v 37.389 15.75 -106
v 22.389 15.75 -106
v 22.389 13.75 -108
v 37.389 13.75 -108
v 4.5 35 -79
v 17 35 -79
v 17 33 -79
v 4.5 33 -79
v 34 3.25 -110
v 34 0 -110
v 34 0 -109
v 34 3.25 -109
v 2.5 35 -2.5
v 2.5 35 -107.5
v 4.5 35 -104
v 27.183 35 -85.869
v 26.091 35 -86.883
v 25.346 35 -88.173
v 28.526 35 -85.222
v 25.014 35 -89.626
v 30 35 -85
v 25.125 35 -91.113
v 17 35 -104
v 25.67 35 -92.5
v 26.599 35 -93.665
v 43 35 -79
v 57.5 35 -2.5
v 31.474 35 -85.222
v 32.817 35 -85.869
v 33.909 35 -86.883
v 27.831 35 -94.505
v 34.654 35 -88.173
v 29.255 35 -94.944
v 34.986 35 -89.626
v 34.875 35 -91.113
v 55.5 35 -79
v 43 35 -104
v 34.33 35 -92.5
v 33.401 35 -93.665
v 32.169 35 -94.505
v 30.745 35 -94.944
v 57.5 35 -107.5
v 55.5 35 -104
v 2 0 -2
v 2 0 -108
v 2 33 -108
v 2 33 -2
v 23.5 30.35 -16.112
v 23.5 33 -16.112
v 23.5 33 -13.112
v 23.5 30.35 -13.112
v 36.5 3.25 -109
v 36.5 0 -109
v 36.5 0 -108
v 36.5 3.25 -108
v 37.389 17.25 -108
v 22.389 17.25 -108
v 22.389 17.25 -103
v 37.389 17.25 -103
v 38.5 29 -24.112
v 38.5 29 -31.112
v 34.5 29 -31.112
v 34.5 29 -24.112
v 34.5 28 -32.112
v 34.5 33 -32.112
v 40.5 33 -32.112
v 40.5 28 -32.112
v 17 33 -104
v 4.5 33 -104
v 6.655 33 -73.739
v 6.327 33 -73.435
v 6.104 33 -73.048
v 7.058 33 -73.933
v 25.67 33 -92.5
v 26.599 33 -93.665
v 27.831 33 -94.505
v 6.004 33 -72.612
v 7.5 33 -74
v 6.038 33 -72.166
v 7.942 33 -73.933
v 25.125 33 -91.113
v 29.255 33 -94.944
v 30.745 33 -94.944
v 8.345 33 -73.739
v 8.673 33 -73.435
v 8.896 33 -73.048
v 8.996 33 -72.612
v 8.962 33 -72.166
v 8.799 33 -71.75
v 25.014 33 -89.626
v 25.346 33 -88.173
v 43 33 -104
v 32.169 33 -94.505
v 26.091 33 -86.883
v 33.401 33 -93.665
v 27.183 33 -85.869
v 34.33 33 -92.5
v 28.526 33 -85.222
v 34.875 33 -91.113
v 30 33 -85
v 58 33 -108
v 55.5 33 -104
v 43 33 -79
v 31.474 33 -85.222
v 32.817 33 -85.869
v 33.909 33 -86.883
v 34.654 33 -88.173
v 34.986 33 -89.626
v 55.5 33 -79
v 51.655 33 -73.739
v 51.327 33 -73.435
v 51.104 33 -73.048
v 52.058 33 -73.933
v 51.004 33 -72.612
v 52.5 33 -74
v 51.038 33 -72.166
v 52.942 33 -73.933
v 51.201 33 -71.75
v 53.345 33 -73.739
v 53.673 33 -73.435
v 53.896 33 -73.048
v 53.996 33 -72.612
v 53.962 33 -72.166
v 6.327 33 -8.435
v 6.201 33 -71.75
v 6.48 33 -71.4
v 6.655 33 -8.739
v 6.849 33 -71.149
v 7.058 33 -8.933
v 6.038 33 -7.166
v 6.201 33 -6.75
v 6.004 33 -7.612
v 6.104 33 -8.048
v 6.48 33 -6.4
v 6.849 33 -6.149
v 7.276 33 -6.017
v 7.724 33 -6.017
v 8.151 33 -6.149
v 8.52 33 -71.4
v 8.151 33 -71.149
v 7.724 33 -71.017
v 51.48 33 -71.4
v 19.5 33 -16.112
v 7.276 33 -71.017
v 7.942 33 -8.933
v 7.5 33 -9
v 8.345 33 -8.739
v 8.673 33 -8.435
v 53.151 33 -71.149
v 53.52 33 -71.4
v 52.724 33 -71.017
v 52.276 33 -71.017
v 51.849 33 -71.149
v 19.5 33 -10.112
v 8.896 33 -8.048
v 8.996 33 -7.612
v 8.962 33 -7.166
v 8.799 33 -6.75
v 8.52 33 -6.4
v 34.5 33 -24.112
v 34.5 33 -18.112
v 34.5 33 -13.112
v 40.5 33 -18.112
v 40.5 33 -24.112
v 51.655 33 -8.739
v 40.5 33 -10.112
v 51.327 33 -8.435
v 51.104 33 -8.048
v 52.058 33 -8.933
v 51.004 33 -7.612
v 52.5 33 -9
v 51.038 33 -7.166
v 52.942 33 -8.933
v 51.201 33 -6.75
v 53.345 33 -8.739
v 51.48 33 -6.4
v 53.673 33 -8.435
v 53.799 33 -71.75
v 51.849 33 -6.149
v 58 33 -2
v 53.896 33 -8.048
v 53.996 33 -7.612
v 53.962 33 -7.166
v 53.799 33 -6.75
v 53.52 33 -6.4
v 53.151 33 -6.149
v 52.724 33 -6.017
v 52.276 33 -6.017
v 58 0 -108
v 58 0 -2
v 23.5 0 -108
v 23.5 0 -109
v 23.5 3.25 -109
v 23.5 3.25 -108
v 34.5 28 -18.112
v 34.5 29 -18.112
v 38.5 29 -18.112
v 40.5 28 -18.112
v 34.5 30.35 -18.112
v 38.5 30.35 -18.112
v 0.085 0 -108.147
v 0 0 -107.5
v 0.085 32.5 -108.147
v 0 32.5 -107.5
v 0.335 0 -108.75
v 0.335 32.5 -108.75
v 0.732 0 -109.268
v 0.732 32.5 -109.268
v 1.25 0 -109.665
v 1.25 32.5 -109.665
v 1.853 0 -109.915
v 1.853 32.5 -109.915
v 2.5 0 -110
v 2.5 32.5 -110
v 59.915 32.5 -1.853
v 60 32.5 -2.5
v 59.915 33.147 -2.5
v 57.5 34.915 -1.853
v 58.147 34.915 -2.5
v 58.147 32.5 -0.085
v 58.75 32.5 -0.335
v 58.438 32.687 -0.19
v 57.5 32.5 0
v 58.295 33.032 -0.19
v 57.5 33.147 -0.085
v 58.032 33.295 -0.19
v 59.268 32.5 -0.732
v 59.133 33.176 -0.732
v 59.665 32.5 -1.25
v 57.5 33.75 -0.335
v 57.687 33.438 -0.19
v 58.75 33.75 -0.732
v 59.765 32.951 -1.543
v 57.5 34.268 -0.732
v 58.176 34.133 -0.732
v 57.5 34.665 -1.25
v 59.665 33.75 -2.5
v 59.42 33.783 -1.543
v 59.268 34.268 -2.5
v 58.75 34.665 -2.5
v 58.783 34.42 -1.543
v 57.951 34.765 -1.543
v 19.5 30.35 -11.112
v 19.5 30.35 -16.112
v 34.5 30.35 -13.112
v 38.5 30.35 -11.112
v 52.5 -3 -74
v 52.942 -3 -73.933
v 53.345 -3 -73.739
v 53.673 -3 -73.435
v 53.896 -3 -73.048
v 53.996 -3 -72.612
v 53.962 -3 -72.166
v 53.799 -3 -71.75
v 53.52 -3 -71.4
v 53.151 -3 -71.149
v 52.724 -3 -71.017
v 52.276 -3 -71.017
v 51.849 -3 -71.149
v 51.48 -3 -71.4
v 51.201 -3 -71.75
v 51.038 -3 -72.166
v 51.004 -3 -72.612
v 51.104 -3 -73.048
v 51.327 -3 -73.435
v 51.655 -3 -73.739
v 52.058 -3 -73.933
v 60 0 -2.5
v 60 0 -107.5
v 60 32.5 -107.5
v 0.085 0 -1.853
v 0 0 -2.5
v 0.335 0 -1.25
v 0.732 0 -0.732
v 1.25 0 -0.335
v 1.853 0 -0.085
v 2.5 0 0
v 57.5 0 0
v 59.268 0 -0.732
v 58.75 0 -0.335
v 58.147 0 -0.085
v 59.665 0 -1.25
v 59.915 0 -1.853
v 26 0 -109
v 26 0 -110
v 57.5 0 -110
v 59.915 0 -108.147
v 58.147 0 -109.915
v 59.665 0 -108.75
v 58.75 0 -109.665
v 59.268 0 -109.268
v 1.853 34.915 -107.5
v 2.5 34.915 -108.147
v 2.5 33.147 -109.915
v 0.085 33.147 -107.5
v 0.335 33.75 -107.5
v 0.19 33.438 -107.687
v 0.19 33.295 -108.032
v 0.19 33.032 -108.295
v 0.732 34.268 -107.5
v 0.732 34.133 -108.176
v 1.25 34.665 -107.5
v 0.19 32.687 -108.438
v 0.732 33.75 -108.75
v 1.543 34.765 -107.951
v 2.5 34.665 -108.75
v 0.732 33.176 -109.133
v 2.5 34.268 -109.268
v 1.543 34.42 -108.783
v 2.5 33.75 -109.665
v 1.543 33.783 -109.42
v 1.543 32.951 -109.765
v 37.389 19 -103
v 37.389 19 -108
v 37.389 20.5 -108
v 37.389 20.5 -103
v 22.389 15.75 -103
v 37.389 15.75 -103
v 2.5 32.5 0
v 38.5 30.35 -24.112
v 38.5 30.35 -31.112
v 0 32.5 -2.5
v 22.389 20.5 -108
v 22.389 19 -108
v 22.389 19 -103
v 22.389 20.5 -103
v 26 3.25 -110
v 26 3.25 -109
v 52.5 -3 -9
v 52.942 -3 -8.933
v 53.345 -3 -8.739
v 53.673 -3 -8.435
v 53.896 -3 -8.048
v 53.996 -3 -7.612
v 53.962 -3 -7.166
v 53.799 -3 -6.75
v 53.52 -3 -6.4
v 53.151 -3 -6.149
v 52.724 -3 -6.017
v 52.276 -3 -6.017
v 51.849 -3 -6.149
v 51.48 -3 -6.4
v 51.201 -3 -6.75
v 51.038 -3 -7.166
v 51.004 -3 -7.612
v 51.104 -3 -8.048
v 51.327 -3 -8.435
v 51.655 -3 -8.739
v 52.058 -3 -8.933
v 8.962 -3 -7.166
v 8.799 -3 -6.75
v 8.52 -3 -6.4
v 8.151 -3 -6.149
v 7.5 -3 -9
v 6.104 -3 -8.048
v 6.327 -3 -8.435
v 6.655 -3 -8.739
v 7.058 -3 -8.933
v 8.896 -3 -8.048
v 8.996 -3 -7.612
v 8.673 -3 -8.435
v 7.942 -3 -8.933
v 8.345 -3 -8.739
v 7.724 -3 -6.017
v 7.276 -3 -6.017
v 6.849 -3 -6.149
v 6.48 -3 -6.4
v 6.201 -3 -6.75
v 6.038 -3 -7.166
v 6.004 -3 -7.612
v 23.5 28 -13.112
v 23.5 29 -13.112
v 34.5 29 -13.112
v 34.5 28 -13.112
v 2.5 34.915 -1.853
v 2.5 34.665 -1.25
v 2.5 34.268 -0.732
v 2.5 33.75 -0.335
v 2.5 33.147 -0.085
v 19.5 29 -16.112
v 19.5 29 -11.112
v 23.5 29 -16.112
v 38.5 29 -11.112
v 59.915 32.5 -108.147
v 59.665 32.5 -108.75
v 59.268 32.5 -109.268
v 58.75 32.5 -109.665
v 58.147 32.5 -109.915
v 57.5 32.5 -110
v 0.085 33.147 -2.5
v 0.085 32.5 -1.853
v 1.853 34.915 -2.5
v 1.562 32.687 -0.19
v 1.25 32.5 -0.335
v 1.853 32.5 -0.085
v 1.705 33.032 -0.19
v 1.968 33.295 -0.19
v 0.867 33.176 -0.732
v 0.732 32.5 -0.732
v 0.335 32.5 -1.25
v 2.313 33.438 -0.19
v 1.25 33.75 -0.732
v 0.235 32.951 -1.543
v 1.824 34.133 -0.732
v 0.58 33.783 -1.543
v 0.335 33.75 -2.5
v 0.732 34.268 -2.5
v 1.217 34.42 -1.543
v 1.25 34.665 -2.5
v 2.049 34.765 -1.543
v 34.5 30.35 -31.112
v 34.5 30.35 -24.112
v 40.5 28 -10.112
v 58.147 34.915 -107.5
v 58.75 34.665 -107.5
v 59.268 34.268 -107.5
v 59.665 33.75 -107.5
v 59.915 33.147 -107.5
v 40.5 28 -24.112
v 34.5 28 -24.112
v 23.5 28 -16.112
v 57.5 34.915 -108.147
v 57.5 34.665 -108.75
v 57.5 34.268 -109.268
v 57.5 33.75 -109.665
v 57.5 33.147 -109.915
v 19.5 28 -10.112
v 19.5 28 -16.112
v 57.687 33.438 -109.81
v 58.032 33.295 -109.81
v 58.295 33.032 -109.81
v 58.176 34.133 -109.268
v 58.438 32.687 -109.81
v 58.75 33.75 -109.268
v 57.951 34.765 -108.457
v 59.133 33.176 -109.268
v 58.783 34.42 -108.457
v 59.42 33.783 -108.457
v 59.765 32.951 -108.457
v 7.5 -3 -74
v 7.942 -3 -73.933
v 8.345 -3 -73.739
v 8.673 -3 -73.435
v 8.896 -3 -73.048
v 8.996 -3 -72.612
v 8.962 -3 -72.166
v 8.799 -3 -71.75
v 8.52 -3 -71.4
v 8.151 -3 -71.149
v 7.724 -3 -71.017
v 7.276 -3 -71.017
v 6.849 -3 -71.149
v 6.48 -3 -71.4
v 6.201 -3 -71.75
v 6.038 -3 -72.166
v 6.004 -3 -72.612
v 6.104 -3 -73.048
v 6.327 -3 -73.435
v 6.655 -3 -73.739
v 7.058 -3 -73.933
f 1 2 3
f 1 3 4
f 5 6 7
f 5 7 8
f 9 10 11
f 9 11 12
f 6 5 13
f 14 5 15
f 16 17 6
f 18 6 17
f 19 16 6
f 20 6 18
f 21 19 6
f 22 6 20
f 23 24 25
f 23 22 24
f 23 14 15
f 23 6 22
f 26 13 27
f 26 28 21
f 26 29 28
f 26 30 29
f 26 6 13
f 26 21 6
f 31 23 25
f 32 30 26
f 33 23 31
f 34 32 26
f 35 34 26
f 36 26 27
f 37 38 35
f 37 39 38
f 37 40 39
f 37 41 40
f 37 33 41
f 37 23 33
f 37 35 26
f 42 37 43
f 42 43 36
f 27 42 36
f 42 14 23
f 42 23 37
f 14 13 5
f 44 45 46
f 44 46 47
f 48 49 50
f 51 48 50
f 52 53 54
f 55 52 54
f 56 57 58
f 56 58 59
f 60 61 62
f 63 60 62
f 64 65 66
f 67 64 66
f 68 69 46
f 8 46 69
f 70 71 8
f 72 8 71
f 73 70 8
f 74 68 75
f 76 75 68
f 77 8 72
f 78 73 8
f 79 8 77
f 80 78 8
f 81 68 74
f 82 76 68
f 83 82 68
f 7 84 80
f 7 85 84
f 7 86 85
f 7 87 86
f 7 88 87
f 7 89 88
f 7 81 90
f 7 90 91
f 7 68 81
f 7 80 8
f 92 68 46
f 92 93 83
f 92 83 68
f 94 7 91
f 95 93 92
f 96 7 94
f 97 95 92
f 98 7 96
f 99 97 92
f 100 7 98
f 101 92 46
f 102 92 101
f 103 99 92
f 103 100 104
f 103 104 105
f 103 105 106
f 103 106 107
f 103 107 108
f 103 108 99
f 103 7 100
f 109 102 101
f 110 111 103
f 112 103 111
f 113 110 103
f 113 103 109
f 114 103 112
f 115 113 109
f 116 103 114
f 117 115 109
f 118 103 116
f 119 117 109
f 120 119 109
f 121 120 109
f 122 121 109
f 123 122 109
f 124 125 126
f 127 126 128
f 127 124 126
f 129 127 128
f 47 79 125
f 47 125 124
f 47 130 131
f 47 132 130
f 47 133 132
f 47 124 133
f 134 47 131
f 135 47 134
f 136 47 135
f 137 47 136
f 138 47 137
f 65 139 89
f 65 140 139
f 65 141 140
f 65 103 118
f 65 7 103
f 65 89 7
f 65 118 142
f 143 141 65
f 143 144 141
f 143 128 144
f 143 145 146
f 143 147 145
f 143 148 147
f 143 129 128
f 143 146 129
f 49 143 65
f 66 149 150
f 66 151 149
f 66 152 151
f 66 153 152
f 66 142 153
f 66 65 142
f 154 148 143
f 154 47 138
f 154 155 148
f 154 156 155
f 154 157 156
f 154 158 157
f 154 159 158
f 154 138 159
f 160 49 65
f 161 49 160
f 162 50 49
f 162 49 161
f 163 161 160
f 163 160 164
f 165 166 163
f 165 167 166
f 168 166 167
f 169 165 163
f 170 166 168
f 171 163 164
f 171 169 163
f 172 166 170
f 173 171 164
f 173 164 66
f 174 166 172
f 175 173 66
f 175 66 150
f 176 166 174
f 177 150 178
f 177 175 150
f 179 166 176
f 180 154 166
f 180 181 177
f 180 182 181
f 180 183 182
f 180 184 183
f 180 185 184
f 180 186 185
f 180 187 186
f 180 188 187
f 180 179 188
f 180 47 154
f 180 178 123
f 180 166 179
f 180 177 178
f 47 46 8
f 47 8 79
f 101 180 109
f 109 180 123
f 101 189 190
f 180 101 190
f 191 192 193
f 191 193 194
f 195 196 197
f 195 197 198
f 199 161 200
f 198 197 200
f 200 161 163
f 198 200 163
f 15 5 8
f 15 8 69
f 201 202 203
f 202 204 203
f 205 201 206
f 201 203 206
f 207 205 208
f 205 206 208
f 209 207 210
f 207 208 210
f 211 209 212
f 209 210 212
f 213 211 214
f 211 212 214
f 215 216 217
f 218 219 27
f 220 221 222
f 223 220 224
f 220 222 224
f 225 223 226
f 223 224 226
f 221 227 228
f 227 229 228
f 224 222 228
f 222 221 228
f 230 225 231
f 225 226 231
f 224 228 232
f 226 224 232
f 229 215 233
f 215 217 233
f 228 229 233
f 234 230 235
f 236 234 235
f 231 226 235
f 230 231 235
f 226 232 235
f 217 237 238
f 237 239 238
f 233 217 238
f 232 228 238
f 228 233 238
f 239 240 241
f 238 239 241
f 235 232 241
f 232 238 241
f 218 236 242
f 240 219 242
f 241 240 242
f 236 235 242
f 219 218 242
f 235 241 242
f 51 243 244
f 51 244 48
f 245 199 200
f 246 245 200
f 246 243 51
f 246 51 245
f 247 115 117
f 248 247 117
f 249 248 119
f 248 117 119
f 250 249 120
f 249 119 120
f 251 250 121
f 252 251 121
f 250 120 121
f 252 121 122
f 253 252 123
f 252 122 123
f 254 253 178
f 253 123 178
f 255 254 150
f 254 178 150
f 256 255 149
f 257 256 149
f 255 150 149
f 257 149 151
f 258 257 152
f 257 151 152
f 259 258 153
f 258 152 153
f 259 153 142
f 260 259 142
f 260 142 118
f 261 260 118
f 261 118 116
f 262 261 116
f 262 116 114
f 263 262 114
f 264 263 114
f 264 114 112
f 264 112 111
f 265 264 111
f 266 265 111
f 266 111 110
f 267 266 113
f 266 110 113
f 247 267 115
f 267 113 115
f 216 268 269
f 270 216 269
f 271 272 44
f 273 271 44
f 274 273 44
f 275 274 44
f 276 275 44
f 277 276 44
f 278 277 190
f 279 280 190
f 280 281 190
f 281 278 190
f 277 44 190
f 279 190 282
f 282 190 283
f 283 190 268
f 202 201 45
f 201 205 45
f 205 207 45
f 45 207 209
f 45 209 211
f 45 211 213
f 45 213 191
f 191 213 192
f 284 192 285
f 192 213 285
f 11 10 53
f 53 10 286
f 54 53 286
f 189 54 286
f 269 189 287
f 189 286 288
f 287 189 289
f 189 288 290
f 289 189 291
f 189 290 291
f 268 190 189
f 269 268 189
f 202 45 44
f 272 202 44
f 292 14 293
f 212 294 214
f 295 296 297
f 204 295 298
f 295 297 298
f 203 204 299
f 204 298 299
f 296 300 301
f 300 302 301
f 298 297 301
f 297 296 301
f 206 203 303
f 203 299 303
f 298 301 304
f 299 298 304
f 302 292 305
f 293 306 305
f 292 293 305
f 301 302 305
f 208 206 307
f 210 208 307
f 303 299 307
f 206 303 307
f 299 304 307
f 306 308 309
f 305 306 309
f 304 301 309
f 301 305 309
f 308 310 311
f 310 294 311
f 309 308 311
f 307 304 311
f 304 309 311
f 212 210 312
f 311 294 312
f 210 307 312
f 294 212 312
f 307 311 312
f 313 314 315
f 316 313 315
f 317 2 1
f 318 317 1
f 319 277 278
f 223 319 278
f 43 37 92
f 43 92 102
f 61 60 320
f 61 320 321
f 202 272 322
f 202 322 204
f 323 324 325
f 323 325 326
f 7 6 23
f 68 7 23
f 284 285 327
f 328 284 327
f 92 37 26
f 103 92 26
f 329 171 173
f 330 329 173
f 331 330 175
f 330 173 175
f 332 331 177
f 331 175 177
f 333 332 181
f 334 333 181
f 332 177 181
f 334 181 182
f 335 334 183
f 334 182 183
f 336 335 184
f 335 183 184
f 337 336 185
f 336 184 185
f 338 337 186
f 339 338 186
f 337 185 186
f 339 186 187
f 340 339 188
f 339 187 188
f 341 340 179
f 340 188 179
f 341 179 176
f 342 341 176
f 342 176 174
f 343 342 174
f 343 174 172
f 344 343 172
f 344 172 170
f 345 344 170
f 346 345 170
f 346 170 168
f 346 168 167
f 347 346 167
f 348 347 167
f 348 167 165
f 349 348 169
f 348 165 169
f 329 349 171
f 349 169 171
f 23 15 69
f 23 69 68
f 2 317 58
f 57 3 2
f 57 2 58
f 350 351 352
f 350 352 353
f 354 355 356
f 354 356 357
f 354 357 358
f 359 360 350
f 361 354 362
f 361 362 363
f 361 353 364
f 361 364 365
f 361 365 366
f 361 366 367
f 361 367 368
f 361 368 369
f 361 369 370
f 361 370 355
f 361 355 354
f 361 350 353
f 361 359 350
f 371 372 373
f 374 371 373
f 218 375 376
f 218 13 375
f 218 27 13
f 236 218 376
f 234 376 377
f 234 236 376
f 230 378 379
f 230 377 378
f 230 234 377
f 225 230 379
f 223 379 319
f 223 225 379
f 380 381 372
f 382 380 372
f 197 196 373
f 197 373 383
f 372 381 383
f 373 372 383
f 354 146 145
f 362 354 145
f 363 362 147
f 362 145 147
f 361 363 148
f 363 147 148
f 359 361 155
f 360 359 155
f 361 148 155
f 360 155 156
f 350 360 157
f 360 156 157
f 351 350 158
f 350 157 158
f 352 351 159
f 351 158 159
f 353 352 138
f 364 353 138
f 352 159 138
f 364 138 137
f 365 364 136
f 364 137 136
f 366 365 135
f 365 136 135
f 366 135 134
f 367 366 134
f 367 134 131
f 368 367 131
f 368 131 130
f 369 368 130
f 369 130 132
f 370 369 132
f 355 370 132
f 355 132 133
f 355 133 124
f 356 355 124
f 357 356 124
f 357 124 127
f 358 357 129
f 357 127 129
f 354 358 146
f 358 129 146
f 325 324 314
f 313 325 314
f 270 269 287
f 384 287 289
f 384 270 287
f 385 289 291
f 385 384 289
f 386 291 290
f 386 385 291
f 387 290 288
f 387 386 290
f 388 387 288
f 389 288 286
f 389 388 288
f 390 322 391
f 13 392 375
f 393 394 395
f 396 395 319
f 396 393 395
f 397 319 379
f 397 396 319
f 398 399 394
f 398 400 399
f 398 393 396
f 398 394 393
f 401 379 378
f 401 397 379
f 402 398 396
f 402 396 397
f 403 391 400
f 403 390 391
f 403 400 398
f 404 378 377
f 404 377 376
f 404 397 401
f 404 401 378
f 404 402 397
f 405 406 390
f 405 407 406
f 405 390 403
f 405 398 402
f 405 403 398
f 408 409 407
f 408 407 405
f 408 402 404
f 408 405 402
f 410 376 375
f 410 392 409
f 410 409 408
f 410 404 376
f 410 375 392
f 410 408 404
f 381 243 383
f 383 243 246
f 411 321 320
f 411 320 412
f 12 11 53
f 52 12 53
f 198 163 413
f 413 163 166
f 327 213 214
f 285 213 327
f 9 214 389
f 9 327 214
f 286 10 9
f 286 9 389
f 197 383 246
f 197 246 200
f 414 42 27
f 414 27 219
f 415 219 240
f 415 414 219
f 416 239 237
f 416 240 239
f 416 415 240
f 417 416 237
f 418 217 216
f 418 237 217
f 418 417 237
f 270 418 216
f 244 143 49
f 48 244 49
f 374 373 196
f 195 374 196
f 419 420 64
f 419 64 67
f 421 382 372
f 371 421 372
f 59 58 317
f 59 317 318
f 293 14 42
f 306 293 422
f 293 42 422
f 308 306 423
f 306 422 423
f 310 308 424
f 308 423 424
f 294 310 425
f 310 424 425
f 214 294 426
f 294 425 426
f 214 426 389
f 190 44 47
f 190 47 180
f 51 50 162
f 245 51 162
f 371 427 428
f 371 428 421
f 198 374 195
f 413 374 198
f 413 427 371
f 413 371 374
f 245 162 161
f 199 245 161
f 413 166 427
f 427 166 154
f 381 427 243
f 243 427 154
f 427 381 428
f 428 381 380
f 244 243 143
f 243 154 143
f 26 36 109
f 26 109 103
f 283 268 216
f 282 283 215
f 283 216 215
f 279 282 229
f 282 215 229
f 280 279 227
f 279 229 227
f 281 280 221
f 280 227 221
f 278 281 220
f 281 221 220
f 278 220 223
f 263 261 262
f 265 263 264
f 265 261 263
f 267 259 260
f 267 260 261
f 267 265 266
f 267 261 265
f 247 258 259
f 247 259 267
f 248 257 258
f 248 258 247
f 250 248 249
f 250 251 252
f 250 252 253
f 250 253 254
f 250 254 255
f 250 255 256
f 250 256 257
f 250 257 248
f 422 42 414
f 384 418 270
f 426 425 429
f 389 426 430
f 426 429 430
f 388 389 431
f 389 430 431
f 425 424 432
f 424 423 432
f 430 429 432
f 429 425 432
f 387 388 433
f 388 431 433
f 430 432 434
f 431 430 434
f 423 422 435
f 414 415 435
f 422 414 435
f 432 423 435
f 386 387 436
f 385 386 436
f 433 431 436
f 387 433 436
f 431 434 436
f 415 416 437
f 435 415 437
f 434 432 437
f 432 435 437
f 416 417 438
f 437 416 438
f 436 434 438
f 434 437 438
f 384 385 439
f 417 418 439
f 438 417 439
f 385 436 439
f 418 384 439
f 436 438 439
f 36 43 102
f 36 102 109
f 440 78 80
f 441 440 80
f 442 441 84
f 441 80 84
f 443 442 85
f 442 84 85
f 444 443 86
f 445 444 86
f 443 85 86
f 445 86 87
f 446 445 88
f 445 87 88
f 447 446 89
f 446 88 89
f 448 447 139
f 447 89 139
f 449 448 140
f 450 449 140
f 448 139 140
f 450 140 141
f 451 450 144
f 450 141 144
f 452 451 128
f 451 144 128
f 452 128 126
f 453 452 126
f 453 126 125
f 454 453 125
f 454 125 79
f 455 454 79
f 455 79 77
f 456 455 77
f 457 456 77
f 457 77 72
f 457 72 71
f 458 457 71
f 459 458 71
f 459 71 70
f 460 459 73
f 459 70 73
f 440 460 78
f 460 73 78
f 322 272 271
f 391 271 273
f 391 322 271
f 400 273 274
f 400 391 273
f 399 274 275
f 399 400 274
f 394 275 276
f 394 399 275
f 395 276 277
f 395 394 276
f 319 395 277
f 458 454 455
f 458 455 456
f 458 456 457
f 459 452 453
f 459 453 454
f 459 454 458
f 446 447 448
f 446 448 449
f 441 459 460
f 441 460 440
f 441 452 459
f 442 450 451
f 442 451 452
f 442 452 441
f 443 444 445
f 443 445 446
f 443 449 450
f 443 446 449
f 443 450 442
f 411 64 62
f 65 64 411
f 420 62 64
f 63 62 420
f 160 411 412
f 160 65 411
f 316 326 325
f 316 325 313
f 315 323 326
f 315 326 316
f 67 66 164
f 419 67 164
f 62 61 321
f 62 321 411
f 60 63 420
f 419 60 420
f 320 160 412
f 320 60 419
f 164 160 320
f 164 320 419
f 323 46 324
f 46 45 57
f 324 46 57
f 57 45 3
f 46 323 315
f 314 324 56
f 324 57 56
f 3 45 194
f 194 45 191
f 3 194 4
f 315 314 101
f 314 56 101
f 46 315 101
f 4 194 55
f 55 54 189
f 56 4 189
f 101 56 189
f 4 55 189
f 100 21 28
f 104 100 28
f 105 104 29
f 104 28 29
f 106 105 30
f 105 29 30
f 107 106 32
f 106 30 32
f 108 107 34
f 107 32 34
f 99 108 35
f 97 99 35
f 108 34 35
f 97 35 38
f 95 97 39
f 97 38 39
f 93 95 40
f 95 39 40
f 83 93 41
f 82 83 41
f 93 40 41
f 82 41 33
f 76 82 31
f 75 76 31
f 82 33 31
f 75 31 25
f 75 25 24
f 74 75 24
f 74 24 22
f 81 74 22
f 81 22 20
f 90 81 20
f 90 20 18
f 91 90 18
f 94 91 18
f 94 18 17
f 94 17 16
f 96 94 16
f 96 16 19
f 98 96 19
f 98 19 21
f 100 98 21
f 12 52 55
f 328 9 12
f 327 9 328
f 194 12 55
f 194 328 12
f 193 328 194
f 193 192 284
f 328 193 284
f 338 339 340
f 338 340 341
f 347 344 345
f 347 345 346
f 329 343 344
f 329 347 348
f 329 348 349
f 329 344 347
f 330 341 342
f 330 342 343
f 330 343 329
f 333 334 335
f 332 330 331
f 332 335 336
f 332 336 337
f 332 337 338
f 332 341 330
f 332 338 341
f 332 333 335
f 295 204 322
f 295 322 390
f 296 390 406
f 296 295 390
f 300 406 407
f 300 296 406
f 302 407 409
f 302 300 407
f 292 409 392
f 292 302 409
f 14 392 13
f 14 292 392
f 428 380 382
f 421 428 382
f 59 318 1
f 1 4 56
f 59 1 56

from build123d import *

# Parameters (mm, degrees)
SKETCH1_W           = 60
SKETCH1_H           = 110
BOSS_EXTRUDE1_DEPTH = 35
SKETCH2_W           = 56
SKETCH2_H           = 106
CUT_EXTRUDE1_DEPTH  = 33
SKETCH3_R           = 1.5
BOSS_EXTRUDE2_DEPTH = 36
CUT_EXTRUDE2_DEPTH  = 21
SKETCH6_R           = 5
CUT_EXTRUDE3_DEPTH  = 21
SKETCH7_W           = 8
SKETCH7_H           = 3.25
CUT_EXTRUDE4_DEPTH  = 21
SKETCH8_W           = 13
SKETCH8_H           = 1
CUT_EXTRUDE5_DEPTH  = 3.25
FILLET1_R           = 2.5
SKETCH9_W           = 6
SKETCH9_H           = 8
BOSS_EXTRUDE3_DEPTH = 5
SKETCH10_W          = 18
SKETCH10_H          = 20
CUT_EXTRUDE6_DEPTH  = 1.35
SKETCH11_W          = 4.702418378
SKETCH11_H          = 7.605650594
CUT_EXTRUDE7_DEPTH  = 1.35
SKETCH13_W          = 15
SKETCH13_H          = 1.5
BOSS_EXTRUDE4_DEPTH = 5
CHAMFER1_SIZE       = 2
CUT_EXTRUDE9_START  = -5
SKETCH14_W          = 1
SKETCH14_H          = 3
CUT_EXTRUDE9_DEPTH  = 5


with BuildPart() as part:
    # Sketch1 → Boss-Extrude1 (new body)
    with BuildSketch(Plane(origin=(0, 0, 0), x_dir=(1, 0, 0), z_dir=(0, 1, 0))):
        with Locations((30, 55)):
            Rectangle(SKETCH1_W, SKETCH1_H)
    extrude(amount=BOSS_EXTRUDE1_DEPTH)

    # Sketch2 → Cut-Extrude1 (cut)
    with BuildSketch(Plane.XZ):
        with Locations((30, -55)):
            Rectangle(SKETCH2_W, SKETCH2_H)
    extrude(amount=-CUT_EXTRUDE1_DEPTH, mode=Mode.SUBTRACT)

    # Sketch3 → Boss-Extrude2 (add)
    with BuildSketch(Plane.XZ.offset(-33)):
        with Locations(Location((7.5, -7.5, 0), (0, 0, 270))):
            Circle(SKETCH3_R)
        with Locations(Location((52.5, -7.5, 0), (0, 0, 270))):
            Circle(SKETCH3_R)
        with Locations(Location((7.5, -72.5, 0), (0, 0, 270))):
            Circle(SKETCH3_R)
        with Locations(Location((52.5, -72.5, 0), (0, 0, 270))):
            Circle(SKETCH3_R)
    extrude(amount=BOSS_EXTRUDE2_DEPTH)

    # Sketch4 → Cut-Extrude2 (cut)
    with BuildSketch(Plane(origin=(0, 35, 0), x_dir=(1, 0, 0), z_dir=(0, 1, 0))):
        Polygon((4.5, 104), (17, 104), (17, 85.965044769), (17, 79), (4.5, 79), align=None)
        Polygon((43, 104), (55.5, 104), (55.5, 79), (43, 79), (43, 85.965044769), align=None)
    extrude(amount=-CUT_EXTRUDE2_DEPTH, mode=Mode.SUBTRACT)

    # Sketch6 → Cut-Extrude3 (cut)
    with BuildSketch(Plane(origin=(0, 35, 0), x_dir=(1, 0, 0), z_dir=(0, 1, 0))):
        with Locations(Location((30, 90, 0), (0, 0, 270))):
            Circle(SKETCH6_R)
    extrude(amount=-CUT_EXTRUDE3_DEPTH, mode=Mode.SUBTRACT)

    # Sketch7 → Cut-Extrude4 (cut)
    with BuildSketch(Plane(origin=(0, 0, -110), x_dir=(-1, 0, 0), z_dir=(0, 0, -1))):
        with Locations((-30, 1.625)):
            Rectangle(SKETCH7_W, SKETCH7_H)
    extrude(amount=-CUT_EXTRUDE4_DEPTH, mode=Mode.SUBTRACT)

    # Sketch8 → Cut-Extrude5 (cut)
    with BuildSketch(Plane.XZ):
        with Locations((30, -108.5)):
            Rectangle(SKETCH8_W, SKETCH8_H)
    extrude(amount=-CUT_EXTRUDE5_DEPTH, mode=Mode.SUBTRACT)

    # Fillet1
    fillet1_edges = [part.edges().sort_by_distance(p)[0] for p in [
        (60, 35, -55),
        (30, 35, -110),
        (0, 35, -55),
        (0, 17.5, -110),
        (60, 17.5, -110),
        (60, 17.5, 0),
        (0, 17.5, 0),
        (30, 35, 0),
    ]]
    fillet(fillet1_edges, radius=FILLET1_R)

    # Sketch9 → Boss-Extrude3 (add)
    with BuildSketch(Plane.XZ.offset(-33)):
        Polygon((19.5, -10.111573996), (19.5, -16.111573996), (24.5, -16.111573996), (24.5, -13.111573996), (34.5, -13.111573996), (34.5, -18.111573996), (40.5, -18.111573996), (40.5, -10.111573996), align=None)
        with Locations((37.5, -28.111573996)):
            Rectangle(SKETCH9_W, SKETCH9_H)
    extrude(amount=BOSS_EXTRUDE3_DEPTH)

    # Sketch10 → Cut-Extrude6 (cut)
    with BuildSketch(Plane(origin=(0, 29, 0), x_dir=(-1, 0, 0), z_dir=(0, -1, 0))):
        with Locations((-29.5, 21.111573996)):
            Rectangle(SKETCH10_W, SKETCH10_H)
    extrude(amount=-CUT_EXTRUDE6_DEPTH, mode=Mode.SUBTRACT)

    # Sketch11 → Cut-Extrude7 (cut)
    with BuildSketch(Plane.XZ.offset(-30.35)):
        with Locations((19.397015068, -14.914399293)):
            Rectangle(SKETCH11_W, SKETCH11_H)
    extrude(amount=CUT_EXTRUDE7_DEPTH, mode=Mode.SUBTRACT)

    # Sketch13 → Boss-Extrude4 (add)
    with BuildSketch(Plane.XY.offset(-108)):
        with Locations((29.888929183, 19.75)):
            Rectangle(SKETCH13_W, SKETCH13_H)
        with Locations((29.888929183, 16.5)):
            Rectangle(SKETCH13_W, SKETCH13_H)
    extrude(amount=BOSS_EXTRUDE4_DEPTH)

    # Chamfer1
    chamfer1_edges = [part.edges().sort_by_distance(p)[0] for p in [
        (29.888929183, 15.75, -108),
    ]]
    chamfer(chamfer1_edges, length=CHAMFER1_SIZE)

    # Sketch14 → Cut-Extrude9 (cut)
    with BuildSketch(Plane.XZ.offset(-28).offset(CUT_EXTRUDE9_START)):
        with Locations((24, -14.611573996)):
            Rectangle(SKETCH14_W, SKETCH14_H)
    extrude(amount=CUT_EXTRUDE9_DEPTH, mode=Mode.SUBTRACT)


solid = part.part
